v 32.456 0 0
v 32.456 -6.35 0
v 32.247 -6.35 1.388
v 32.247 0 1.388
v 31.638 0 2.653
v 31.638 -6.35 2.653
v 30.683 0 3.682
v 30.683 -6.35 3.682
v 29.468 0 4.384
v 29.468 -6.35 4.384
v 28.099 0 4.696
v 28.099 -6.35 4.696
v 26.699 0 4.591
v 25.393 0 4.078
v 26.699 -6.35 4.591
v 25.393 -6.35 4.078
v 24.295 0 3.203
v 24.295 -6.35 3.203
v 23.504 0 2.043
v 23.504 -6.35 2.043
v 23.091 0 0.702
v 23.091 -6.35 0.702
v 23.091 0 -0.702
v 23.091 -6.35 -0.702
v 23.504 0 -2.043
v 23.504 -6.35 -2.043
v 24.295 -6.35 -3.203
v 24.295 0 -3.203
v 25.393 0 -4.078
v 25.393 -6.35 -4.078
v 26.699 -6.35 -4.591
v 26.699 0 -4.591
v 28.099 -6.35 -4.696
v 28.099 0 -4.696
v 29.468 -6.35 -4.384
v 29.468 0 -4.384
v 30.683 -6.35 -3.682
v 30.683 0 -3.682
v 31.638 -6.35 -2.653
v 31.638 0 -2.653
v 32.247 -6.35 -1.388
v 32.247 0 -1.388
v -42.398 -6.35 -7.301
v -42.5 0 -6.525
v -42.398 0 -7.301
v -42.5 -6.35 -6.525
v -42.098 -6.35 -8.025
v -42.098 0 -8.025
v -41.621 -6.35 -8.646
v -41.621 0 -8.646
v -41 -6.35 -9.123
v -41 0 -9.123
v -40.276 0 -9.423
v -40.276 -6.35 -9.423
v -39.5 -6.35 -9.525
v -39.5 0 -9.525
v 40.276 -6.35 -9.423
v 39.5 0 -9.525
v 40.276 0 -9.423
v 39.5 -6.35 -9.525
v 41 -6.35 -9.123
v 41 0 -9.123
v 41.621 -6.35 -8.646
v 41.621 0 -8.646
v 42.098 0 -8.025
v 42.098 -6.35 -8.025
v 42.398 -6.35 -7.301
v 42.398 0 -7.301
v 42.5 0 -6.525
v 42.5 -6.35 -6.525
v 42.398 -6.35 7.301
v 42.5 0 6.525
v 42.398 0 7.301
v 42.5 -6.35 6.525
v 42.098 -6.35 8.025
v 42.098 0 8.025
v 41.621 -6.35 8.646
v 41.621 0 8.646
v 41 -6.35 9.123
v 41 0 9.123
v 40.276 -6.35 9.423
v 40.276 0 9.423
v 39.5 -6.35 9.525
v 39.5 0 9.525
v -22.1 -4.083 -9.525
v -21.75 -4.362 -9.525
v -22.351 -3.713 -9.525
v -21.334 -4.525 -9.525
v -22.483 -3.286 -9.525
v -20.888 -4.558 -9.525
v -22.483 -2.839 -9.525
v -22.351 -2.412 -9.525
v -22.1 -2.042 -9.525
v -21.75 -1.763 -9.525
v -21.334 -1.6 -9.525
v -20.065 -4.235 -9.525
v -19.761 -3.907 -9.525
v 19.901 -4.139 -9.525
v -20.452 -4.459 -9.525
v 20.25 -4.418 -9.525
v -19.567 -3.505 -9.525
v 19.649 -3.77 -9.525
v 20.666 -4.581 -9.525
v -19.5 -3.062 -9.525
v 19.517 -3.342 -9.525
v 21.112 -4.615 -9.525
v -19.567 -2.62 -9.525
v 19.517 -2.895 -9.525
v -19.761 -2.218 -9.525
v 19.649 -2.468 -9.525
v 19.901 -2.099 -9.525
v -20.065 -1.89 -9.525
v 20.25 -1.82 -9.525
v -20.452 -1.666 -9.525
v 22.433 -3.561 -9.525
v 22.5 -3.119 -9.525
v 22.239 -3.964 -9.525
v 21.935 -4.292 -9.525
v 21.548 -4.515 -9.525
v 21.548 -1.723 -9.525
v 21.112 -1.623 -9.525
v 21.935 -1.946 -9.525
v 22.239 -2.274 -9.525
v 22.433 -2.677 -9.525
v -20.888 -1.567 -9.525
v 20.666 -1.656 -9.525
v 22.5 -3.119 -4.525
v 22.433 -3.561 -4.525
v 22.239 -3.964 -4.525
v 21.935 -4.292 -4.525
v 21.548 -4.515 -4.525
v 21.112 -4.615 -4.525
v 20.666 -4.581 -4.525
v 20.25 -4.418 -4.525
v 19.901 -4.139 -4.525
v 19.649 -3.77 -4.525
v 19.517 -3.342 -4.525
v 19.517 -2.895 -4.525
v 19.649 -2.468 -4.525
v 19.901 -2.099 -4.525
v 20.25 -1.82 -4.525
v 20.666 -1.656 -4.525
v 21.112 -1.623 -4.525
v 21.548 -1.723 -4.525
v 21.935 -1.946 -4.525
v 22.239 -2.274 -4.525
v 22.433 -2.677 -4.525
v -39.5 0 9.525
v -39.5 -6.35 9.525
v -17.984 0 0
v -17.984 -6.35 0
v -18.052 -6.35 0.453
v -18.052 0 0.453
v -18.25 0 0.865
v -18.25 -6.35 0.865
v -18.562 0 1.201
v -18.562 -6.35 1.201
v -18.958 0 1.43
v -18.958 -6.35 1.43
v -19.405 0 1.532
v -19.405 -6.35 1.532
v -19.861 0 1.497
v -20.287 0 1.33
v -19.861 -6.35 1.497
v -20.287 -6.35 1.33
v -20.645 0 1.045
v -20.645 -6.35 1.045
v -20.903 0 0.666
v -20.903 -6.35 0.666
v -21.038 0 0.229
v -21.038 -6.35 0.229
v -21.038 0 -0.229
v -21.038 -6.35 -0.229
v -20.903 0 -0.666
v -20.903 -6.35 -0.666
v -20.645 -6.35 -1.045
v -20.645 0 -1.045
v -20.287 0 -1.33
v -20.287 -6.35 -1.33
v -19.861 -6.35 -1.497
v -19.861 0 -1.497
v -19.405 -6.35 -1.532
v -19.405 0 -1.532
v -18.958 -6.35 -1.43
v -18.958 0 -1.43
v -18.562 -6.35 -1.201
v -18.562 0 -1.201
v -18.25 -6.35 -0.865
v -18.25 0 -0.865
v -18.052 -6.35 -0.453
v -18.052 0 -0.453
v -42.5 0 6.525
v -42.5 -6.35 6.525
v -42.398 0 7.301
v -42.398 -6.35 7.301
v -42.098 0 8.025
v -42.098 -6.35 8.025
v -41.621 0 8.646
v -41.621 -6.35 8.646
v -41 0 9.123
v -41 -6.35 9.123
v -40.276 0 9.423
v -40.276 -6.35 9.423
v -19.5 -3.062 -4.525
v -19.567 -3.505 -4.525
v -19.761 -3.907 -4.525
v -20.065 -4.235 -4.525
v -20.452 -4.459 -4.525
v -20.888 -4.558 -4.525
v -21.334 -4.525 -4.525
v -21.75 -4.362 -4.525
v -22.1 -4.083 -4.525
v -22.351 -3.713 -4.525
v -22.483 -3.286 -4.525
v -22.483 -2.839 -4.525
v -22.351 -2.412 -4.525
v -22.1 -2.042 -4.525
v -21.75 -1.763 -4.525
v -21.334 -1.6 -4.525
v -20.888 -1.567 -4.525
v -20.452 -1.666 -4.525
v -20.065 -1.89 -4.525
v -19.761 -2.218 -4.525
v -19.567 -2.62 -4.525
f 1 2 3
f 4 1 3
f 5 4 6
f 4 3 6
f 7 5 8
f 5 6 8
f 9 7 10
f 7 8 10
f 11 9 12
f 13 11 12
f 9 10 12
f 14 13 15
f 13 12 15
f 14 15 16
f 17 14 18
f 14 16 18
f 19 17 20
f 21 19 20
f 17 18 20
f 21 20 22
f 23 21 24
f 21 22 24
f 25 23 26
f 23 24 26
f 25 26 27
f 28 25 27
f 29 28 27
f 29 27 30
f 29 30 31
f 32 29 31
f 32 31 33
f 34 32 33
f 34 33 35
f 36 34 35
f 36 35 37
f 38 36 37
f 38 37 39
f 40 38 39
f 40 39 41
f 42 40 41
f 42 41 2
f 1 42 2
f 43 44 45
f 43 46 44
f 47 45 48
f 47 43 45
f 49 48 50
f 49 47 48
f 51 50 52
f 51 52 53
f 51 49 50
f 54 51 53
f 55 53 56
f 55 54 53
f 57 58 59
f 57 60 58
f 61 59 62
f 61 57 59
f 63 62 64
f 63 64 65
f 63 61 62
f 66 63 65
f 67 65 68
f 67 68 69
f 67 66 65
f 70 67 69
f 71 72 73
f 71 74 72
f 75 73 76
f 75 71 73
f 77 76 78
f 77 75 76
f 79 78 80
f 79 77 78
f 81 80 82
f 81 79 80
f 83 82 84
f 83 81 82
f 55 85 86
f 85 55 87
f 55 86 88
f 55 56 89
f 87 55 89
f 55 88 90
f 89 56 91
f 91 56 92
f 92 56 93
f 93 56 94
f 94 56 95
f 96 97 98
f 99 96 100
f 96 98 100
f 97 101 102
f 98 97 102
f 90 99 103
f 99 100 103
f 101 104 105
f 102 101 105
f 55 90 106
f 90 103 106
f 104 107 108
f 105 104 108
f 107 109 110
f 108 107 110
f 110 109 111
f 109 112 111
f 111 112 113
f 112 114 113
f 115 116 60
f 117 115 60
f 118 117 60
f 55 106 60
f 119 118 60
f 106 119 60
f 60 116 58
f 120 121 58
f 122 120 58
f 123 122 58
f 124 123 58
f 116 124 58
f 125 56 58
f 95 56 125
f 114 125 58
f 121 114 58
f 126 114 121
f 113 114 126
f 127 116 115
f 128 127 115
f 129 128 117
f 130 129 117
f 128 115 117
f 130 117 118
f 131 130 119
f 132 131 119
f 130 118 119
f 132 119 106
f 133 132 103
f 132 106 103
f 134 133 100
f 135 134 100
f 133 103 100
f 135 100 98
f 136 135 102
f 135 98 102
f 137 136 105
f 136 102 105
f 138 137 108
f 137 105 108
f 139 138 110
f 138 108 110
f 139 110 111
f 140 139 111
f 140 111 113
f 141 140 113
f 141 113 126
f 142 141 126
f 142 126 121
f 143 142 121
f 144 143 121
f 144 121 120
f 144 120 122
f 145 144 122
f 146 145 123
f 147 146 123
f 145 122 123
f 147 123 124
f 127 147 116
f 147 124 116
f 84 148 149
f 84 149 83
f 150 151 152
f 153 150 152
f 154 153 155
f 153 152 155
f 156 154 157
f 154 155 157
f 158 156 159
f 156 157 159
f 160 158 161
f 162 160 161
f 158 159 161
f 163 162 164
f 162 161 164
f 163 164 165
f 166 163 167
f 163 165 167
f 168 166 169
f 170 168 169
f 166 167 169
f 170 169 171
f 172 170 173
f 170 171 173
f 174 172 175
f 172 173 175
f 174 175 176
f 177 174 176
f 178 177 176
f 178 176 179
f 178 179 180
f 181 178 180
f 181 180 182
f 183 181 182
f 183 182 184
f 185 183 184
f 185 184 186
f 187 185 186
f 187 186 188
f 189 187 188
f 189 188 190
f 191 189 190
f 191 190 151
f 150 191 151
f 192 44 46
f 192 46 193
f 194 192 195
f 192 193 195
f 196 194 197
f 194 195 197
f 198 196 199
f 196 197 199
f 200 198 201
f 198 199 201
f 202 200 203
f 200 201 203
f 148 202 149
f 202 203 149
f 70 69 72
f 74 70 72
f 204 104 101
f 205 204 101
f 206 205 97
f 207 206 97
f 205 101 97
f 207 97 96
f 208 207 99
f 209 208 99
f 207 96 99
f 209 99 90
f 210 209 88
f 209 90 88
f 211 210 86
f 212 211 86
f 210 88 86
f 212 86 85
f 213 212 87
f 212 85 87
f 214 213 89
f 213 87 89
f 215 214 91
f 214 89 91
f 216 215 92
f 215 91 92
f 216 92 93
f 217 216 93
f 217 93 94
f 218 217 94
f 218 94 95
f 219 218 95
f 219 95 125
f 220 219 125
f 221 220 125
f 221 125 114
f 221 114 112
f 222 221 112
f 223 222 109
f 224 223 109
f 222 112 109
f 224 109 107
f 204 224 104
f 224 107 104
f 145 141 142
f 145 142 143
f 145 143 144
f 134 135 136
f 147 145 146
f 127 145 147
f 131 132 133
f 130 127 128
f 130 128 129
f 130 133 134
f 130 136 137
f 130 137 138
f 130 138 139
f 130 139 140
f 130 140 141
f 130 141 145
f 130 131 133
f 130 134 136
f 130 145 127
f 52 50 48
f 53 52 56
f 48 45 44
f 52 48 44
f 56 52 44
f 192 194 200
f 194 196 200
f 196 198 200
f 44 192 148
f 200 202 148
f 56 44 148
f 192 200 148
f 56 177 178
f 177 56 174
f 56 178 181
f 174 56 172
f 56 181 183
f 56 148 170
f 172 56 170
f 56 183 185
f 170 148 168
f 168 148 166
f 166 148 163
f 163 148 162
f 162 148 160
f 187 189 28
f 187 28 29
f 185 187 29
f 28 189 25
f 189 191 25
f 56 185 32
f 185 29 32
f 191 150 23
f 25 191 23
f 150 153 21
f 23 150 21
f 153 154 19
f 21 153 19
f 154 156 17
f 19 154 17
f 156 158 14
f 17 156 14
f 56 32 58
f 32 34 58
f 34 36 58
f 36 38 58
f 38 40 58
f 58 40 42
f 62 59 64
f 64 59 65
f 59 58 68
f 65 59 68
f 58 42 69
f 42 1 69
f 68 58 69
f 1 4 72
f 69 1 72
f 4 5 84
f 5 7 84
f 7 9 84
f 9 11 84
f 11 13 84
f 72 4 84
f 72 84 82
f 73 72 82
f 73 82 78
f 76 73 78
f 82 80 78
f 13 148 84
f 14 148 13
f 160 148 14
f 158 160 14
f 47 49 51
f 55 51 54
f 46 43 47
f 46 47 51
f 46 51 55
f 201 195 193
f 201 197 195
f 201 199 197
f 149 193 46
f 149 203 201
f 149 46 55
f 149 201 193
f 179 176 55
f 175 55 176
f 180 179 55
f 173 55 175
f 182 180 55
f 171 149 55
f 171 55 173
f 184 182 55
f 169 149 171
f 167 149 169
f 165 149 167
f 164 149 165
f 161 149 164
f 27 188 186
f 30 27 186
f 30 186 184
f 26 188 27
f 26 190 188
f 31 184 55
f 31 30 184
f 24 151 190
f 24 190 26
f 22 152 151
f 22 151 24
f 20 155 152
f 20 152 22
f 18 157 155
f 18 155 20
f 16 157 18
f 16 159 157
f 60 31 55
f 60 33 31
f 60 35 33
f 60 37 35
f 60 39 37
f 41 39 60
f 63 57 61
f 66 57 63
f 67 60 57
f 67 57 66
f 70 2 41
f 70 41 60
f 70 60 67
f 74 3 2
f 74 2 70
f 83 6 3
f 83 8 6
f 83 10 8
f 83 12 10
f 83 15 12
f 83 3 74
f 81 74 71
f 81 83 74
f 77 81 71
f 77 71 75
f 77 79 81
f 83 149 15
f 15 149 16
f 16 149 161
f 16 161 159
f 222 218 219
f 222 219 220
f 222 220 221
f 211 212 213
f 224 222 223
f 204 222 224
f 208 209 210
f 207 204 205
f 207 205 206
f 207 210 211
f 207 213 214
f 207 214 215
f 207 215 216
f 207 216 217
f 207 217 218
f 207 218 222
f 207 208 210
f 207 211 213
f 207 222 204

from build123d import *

# Parameters (mm, degrees)
F0_W     = 85
F0_H     = 19.05
F1_DEPTH = 6.35
F2_R     = 3
F3_R     = 1.535965
F3_R_2   = 4.709265
F4_DEPTH = 25
F5_R     = 1.5
F6_DEPTH = 5


with BuildPart() as f1:
    # F0 (on Front) → F1 (new body)
    with BuildSketch(Plane.XZ):
        Rectangle(F0_W, F0_H)
    extrude(amount=F1_DEPTH)

    # F2
    f2_edges = [f1.edges().sort_by_distance(p)[0] for p in [
        (-42.5, -3.175, 9.525),
        (42.5, -3.175, 9.525),
        (-42.5, -3.175, -9.525),
        (42.5, -3.175, -9.525),
    ]]
    fillet(f2_edges, radius=F2_R)

    # F3 (on face) → F4 (cut)
    with BuildSketch(Plane.XZ.offset(6.35)):
        with Locations((-19.519491, 0)):
            Circle(F3_R)
        with Locations((27.747195, 0)):
            Circle(F3_R_2)
    extrude(amount=-F4_DEPTH, mode=Mode.SUBTRACT)

    # F5 (on face) → F6 (cut)
    with BuildSketch(Plane(origin=(0, 0, -9.525), x_dir=(1, 0, 0), z_dir=(0, 0, -1))):
        with Locations((-21, 3.0625)):
            Circle(F5_R)
        with Locations((21.000085, 3.118848)):
            Circle(F5_R)
    extrude(amount=-F6_DEPTH, mode=Mode.SUBTRACT)


solid = f1.part
